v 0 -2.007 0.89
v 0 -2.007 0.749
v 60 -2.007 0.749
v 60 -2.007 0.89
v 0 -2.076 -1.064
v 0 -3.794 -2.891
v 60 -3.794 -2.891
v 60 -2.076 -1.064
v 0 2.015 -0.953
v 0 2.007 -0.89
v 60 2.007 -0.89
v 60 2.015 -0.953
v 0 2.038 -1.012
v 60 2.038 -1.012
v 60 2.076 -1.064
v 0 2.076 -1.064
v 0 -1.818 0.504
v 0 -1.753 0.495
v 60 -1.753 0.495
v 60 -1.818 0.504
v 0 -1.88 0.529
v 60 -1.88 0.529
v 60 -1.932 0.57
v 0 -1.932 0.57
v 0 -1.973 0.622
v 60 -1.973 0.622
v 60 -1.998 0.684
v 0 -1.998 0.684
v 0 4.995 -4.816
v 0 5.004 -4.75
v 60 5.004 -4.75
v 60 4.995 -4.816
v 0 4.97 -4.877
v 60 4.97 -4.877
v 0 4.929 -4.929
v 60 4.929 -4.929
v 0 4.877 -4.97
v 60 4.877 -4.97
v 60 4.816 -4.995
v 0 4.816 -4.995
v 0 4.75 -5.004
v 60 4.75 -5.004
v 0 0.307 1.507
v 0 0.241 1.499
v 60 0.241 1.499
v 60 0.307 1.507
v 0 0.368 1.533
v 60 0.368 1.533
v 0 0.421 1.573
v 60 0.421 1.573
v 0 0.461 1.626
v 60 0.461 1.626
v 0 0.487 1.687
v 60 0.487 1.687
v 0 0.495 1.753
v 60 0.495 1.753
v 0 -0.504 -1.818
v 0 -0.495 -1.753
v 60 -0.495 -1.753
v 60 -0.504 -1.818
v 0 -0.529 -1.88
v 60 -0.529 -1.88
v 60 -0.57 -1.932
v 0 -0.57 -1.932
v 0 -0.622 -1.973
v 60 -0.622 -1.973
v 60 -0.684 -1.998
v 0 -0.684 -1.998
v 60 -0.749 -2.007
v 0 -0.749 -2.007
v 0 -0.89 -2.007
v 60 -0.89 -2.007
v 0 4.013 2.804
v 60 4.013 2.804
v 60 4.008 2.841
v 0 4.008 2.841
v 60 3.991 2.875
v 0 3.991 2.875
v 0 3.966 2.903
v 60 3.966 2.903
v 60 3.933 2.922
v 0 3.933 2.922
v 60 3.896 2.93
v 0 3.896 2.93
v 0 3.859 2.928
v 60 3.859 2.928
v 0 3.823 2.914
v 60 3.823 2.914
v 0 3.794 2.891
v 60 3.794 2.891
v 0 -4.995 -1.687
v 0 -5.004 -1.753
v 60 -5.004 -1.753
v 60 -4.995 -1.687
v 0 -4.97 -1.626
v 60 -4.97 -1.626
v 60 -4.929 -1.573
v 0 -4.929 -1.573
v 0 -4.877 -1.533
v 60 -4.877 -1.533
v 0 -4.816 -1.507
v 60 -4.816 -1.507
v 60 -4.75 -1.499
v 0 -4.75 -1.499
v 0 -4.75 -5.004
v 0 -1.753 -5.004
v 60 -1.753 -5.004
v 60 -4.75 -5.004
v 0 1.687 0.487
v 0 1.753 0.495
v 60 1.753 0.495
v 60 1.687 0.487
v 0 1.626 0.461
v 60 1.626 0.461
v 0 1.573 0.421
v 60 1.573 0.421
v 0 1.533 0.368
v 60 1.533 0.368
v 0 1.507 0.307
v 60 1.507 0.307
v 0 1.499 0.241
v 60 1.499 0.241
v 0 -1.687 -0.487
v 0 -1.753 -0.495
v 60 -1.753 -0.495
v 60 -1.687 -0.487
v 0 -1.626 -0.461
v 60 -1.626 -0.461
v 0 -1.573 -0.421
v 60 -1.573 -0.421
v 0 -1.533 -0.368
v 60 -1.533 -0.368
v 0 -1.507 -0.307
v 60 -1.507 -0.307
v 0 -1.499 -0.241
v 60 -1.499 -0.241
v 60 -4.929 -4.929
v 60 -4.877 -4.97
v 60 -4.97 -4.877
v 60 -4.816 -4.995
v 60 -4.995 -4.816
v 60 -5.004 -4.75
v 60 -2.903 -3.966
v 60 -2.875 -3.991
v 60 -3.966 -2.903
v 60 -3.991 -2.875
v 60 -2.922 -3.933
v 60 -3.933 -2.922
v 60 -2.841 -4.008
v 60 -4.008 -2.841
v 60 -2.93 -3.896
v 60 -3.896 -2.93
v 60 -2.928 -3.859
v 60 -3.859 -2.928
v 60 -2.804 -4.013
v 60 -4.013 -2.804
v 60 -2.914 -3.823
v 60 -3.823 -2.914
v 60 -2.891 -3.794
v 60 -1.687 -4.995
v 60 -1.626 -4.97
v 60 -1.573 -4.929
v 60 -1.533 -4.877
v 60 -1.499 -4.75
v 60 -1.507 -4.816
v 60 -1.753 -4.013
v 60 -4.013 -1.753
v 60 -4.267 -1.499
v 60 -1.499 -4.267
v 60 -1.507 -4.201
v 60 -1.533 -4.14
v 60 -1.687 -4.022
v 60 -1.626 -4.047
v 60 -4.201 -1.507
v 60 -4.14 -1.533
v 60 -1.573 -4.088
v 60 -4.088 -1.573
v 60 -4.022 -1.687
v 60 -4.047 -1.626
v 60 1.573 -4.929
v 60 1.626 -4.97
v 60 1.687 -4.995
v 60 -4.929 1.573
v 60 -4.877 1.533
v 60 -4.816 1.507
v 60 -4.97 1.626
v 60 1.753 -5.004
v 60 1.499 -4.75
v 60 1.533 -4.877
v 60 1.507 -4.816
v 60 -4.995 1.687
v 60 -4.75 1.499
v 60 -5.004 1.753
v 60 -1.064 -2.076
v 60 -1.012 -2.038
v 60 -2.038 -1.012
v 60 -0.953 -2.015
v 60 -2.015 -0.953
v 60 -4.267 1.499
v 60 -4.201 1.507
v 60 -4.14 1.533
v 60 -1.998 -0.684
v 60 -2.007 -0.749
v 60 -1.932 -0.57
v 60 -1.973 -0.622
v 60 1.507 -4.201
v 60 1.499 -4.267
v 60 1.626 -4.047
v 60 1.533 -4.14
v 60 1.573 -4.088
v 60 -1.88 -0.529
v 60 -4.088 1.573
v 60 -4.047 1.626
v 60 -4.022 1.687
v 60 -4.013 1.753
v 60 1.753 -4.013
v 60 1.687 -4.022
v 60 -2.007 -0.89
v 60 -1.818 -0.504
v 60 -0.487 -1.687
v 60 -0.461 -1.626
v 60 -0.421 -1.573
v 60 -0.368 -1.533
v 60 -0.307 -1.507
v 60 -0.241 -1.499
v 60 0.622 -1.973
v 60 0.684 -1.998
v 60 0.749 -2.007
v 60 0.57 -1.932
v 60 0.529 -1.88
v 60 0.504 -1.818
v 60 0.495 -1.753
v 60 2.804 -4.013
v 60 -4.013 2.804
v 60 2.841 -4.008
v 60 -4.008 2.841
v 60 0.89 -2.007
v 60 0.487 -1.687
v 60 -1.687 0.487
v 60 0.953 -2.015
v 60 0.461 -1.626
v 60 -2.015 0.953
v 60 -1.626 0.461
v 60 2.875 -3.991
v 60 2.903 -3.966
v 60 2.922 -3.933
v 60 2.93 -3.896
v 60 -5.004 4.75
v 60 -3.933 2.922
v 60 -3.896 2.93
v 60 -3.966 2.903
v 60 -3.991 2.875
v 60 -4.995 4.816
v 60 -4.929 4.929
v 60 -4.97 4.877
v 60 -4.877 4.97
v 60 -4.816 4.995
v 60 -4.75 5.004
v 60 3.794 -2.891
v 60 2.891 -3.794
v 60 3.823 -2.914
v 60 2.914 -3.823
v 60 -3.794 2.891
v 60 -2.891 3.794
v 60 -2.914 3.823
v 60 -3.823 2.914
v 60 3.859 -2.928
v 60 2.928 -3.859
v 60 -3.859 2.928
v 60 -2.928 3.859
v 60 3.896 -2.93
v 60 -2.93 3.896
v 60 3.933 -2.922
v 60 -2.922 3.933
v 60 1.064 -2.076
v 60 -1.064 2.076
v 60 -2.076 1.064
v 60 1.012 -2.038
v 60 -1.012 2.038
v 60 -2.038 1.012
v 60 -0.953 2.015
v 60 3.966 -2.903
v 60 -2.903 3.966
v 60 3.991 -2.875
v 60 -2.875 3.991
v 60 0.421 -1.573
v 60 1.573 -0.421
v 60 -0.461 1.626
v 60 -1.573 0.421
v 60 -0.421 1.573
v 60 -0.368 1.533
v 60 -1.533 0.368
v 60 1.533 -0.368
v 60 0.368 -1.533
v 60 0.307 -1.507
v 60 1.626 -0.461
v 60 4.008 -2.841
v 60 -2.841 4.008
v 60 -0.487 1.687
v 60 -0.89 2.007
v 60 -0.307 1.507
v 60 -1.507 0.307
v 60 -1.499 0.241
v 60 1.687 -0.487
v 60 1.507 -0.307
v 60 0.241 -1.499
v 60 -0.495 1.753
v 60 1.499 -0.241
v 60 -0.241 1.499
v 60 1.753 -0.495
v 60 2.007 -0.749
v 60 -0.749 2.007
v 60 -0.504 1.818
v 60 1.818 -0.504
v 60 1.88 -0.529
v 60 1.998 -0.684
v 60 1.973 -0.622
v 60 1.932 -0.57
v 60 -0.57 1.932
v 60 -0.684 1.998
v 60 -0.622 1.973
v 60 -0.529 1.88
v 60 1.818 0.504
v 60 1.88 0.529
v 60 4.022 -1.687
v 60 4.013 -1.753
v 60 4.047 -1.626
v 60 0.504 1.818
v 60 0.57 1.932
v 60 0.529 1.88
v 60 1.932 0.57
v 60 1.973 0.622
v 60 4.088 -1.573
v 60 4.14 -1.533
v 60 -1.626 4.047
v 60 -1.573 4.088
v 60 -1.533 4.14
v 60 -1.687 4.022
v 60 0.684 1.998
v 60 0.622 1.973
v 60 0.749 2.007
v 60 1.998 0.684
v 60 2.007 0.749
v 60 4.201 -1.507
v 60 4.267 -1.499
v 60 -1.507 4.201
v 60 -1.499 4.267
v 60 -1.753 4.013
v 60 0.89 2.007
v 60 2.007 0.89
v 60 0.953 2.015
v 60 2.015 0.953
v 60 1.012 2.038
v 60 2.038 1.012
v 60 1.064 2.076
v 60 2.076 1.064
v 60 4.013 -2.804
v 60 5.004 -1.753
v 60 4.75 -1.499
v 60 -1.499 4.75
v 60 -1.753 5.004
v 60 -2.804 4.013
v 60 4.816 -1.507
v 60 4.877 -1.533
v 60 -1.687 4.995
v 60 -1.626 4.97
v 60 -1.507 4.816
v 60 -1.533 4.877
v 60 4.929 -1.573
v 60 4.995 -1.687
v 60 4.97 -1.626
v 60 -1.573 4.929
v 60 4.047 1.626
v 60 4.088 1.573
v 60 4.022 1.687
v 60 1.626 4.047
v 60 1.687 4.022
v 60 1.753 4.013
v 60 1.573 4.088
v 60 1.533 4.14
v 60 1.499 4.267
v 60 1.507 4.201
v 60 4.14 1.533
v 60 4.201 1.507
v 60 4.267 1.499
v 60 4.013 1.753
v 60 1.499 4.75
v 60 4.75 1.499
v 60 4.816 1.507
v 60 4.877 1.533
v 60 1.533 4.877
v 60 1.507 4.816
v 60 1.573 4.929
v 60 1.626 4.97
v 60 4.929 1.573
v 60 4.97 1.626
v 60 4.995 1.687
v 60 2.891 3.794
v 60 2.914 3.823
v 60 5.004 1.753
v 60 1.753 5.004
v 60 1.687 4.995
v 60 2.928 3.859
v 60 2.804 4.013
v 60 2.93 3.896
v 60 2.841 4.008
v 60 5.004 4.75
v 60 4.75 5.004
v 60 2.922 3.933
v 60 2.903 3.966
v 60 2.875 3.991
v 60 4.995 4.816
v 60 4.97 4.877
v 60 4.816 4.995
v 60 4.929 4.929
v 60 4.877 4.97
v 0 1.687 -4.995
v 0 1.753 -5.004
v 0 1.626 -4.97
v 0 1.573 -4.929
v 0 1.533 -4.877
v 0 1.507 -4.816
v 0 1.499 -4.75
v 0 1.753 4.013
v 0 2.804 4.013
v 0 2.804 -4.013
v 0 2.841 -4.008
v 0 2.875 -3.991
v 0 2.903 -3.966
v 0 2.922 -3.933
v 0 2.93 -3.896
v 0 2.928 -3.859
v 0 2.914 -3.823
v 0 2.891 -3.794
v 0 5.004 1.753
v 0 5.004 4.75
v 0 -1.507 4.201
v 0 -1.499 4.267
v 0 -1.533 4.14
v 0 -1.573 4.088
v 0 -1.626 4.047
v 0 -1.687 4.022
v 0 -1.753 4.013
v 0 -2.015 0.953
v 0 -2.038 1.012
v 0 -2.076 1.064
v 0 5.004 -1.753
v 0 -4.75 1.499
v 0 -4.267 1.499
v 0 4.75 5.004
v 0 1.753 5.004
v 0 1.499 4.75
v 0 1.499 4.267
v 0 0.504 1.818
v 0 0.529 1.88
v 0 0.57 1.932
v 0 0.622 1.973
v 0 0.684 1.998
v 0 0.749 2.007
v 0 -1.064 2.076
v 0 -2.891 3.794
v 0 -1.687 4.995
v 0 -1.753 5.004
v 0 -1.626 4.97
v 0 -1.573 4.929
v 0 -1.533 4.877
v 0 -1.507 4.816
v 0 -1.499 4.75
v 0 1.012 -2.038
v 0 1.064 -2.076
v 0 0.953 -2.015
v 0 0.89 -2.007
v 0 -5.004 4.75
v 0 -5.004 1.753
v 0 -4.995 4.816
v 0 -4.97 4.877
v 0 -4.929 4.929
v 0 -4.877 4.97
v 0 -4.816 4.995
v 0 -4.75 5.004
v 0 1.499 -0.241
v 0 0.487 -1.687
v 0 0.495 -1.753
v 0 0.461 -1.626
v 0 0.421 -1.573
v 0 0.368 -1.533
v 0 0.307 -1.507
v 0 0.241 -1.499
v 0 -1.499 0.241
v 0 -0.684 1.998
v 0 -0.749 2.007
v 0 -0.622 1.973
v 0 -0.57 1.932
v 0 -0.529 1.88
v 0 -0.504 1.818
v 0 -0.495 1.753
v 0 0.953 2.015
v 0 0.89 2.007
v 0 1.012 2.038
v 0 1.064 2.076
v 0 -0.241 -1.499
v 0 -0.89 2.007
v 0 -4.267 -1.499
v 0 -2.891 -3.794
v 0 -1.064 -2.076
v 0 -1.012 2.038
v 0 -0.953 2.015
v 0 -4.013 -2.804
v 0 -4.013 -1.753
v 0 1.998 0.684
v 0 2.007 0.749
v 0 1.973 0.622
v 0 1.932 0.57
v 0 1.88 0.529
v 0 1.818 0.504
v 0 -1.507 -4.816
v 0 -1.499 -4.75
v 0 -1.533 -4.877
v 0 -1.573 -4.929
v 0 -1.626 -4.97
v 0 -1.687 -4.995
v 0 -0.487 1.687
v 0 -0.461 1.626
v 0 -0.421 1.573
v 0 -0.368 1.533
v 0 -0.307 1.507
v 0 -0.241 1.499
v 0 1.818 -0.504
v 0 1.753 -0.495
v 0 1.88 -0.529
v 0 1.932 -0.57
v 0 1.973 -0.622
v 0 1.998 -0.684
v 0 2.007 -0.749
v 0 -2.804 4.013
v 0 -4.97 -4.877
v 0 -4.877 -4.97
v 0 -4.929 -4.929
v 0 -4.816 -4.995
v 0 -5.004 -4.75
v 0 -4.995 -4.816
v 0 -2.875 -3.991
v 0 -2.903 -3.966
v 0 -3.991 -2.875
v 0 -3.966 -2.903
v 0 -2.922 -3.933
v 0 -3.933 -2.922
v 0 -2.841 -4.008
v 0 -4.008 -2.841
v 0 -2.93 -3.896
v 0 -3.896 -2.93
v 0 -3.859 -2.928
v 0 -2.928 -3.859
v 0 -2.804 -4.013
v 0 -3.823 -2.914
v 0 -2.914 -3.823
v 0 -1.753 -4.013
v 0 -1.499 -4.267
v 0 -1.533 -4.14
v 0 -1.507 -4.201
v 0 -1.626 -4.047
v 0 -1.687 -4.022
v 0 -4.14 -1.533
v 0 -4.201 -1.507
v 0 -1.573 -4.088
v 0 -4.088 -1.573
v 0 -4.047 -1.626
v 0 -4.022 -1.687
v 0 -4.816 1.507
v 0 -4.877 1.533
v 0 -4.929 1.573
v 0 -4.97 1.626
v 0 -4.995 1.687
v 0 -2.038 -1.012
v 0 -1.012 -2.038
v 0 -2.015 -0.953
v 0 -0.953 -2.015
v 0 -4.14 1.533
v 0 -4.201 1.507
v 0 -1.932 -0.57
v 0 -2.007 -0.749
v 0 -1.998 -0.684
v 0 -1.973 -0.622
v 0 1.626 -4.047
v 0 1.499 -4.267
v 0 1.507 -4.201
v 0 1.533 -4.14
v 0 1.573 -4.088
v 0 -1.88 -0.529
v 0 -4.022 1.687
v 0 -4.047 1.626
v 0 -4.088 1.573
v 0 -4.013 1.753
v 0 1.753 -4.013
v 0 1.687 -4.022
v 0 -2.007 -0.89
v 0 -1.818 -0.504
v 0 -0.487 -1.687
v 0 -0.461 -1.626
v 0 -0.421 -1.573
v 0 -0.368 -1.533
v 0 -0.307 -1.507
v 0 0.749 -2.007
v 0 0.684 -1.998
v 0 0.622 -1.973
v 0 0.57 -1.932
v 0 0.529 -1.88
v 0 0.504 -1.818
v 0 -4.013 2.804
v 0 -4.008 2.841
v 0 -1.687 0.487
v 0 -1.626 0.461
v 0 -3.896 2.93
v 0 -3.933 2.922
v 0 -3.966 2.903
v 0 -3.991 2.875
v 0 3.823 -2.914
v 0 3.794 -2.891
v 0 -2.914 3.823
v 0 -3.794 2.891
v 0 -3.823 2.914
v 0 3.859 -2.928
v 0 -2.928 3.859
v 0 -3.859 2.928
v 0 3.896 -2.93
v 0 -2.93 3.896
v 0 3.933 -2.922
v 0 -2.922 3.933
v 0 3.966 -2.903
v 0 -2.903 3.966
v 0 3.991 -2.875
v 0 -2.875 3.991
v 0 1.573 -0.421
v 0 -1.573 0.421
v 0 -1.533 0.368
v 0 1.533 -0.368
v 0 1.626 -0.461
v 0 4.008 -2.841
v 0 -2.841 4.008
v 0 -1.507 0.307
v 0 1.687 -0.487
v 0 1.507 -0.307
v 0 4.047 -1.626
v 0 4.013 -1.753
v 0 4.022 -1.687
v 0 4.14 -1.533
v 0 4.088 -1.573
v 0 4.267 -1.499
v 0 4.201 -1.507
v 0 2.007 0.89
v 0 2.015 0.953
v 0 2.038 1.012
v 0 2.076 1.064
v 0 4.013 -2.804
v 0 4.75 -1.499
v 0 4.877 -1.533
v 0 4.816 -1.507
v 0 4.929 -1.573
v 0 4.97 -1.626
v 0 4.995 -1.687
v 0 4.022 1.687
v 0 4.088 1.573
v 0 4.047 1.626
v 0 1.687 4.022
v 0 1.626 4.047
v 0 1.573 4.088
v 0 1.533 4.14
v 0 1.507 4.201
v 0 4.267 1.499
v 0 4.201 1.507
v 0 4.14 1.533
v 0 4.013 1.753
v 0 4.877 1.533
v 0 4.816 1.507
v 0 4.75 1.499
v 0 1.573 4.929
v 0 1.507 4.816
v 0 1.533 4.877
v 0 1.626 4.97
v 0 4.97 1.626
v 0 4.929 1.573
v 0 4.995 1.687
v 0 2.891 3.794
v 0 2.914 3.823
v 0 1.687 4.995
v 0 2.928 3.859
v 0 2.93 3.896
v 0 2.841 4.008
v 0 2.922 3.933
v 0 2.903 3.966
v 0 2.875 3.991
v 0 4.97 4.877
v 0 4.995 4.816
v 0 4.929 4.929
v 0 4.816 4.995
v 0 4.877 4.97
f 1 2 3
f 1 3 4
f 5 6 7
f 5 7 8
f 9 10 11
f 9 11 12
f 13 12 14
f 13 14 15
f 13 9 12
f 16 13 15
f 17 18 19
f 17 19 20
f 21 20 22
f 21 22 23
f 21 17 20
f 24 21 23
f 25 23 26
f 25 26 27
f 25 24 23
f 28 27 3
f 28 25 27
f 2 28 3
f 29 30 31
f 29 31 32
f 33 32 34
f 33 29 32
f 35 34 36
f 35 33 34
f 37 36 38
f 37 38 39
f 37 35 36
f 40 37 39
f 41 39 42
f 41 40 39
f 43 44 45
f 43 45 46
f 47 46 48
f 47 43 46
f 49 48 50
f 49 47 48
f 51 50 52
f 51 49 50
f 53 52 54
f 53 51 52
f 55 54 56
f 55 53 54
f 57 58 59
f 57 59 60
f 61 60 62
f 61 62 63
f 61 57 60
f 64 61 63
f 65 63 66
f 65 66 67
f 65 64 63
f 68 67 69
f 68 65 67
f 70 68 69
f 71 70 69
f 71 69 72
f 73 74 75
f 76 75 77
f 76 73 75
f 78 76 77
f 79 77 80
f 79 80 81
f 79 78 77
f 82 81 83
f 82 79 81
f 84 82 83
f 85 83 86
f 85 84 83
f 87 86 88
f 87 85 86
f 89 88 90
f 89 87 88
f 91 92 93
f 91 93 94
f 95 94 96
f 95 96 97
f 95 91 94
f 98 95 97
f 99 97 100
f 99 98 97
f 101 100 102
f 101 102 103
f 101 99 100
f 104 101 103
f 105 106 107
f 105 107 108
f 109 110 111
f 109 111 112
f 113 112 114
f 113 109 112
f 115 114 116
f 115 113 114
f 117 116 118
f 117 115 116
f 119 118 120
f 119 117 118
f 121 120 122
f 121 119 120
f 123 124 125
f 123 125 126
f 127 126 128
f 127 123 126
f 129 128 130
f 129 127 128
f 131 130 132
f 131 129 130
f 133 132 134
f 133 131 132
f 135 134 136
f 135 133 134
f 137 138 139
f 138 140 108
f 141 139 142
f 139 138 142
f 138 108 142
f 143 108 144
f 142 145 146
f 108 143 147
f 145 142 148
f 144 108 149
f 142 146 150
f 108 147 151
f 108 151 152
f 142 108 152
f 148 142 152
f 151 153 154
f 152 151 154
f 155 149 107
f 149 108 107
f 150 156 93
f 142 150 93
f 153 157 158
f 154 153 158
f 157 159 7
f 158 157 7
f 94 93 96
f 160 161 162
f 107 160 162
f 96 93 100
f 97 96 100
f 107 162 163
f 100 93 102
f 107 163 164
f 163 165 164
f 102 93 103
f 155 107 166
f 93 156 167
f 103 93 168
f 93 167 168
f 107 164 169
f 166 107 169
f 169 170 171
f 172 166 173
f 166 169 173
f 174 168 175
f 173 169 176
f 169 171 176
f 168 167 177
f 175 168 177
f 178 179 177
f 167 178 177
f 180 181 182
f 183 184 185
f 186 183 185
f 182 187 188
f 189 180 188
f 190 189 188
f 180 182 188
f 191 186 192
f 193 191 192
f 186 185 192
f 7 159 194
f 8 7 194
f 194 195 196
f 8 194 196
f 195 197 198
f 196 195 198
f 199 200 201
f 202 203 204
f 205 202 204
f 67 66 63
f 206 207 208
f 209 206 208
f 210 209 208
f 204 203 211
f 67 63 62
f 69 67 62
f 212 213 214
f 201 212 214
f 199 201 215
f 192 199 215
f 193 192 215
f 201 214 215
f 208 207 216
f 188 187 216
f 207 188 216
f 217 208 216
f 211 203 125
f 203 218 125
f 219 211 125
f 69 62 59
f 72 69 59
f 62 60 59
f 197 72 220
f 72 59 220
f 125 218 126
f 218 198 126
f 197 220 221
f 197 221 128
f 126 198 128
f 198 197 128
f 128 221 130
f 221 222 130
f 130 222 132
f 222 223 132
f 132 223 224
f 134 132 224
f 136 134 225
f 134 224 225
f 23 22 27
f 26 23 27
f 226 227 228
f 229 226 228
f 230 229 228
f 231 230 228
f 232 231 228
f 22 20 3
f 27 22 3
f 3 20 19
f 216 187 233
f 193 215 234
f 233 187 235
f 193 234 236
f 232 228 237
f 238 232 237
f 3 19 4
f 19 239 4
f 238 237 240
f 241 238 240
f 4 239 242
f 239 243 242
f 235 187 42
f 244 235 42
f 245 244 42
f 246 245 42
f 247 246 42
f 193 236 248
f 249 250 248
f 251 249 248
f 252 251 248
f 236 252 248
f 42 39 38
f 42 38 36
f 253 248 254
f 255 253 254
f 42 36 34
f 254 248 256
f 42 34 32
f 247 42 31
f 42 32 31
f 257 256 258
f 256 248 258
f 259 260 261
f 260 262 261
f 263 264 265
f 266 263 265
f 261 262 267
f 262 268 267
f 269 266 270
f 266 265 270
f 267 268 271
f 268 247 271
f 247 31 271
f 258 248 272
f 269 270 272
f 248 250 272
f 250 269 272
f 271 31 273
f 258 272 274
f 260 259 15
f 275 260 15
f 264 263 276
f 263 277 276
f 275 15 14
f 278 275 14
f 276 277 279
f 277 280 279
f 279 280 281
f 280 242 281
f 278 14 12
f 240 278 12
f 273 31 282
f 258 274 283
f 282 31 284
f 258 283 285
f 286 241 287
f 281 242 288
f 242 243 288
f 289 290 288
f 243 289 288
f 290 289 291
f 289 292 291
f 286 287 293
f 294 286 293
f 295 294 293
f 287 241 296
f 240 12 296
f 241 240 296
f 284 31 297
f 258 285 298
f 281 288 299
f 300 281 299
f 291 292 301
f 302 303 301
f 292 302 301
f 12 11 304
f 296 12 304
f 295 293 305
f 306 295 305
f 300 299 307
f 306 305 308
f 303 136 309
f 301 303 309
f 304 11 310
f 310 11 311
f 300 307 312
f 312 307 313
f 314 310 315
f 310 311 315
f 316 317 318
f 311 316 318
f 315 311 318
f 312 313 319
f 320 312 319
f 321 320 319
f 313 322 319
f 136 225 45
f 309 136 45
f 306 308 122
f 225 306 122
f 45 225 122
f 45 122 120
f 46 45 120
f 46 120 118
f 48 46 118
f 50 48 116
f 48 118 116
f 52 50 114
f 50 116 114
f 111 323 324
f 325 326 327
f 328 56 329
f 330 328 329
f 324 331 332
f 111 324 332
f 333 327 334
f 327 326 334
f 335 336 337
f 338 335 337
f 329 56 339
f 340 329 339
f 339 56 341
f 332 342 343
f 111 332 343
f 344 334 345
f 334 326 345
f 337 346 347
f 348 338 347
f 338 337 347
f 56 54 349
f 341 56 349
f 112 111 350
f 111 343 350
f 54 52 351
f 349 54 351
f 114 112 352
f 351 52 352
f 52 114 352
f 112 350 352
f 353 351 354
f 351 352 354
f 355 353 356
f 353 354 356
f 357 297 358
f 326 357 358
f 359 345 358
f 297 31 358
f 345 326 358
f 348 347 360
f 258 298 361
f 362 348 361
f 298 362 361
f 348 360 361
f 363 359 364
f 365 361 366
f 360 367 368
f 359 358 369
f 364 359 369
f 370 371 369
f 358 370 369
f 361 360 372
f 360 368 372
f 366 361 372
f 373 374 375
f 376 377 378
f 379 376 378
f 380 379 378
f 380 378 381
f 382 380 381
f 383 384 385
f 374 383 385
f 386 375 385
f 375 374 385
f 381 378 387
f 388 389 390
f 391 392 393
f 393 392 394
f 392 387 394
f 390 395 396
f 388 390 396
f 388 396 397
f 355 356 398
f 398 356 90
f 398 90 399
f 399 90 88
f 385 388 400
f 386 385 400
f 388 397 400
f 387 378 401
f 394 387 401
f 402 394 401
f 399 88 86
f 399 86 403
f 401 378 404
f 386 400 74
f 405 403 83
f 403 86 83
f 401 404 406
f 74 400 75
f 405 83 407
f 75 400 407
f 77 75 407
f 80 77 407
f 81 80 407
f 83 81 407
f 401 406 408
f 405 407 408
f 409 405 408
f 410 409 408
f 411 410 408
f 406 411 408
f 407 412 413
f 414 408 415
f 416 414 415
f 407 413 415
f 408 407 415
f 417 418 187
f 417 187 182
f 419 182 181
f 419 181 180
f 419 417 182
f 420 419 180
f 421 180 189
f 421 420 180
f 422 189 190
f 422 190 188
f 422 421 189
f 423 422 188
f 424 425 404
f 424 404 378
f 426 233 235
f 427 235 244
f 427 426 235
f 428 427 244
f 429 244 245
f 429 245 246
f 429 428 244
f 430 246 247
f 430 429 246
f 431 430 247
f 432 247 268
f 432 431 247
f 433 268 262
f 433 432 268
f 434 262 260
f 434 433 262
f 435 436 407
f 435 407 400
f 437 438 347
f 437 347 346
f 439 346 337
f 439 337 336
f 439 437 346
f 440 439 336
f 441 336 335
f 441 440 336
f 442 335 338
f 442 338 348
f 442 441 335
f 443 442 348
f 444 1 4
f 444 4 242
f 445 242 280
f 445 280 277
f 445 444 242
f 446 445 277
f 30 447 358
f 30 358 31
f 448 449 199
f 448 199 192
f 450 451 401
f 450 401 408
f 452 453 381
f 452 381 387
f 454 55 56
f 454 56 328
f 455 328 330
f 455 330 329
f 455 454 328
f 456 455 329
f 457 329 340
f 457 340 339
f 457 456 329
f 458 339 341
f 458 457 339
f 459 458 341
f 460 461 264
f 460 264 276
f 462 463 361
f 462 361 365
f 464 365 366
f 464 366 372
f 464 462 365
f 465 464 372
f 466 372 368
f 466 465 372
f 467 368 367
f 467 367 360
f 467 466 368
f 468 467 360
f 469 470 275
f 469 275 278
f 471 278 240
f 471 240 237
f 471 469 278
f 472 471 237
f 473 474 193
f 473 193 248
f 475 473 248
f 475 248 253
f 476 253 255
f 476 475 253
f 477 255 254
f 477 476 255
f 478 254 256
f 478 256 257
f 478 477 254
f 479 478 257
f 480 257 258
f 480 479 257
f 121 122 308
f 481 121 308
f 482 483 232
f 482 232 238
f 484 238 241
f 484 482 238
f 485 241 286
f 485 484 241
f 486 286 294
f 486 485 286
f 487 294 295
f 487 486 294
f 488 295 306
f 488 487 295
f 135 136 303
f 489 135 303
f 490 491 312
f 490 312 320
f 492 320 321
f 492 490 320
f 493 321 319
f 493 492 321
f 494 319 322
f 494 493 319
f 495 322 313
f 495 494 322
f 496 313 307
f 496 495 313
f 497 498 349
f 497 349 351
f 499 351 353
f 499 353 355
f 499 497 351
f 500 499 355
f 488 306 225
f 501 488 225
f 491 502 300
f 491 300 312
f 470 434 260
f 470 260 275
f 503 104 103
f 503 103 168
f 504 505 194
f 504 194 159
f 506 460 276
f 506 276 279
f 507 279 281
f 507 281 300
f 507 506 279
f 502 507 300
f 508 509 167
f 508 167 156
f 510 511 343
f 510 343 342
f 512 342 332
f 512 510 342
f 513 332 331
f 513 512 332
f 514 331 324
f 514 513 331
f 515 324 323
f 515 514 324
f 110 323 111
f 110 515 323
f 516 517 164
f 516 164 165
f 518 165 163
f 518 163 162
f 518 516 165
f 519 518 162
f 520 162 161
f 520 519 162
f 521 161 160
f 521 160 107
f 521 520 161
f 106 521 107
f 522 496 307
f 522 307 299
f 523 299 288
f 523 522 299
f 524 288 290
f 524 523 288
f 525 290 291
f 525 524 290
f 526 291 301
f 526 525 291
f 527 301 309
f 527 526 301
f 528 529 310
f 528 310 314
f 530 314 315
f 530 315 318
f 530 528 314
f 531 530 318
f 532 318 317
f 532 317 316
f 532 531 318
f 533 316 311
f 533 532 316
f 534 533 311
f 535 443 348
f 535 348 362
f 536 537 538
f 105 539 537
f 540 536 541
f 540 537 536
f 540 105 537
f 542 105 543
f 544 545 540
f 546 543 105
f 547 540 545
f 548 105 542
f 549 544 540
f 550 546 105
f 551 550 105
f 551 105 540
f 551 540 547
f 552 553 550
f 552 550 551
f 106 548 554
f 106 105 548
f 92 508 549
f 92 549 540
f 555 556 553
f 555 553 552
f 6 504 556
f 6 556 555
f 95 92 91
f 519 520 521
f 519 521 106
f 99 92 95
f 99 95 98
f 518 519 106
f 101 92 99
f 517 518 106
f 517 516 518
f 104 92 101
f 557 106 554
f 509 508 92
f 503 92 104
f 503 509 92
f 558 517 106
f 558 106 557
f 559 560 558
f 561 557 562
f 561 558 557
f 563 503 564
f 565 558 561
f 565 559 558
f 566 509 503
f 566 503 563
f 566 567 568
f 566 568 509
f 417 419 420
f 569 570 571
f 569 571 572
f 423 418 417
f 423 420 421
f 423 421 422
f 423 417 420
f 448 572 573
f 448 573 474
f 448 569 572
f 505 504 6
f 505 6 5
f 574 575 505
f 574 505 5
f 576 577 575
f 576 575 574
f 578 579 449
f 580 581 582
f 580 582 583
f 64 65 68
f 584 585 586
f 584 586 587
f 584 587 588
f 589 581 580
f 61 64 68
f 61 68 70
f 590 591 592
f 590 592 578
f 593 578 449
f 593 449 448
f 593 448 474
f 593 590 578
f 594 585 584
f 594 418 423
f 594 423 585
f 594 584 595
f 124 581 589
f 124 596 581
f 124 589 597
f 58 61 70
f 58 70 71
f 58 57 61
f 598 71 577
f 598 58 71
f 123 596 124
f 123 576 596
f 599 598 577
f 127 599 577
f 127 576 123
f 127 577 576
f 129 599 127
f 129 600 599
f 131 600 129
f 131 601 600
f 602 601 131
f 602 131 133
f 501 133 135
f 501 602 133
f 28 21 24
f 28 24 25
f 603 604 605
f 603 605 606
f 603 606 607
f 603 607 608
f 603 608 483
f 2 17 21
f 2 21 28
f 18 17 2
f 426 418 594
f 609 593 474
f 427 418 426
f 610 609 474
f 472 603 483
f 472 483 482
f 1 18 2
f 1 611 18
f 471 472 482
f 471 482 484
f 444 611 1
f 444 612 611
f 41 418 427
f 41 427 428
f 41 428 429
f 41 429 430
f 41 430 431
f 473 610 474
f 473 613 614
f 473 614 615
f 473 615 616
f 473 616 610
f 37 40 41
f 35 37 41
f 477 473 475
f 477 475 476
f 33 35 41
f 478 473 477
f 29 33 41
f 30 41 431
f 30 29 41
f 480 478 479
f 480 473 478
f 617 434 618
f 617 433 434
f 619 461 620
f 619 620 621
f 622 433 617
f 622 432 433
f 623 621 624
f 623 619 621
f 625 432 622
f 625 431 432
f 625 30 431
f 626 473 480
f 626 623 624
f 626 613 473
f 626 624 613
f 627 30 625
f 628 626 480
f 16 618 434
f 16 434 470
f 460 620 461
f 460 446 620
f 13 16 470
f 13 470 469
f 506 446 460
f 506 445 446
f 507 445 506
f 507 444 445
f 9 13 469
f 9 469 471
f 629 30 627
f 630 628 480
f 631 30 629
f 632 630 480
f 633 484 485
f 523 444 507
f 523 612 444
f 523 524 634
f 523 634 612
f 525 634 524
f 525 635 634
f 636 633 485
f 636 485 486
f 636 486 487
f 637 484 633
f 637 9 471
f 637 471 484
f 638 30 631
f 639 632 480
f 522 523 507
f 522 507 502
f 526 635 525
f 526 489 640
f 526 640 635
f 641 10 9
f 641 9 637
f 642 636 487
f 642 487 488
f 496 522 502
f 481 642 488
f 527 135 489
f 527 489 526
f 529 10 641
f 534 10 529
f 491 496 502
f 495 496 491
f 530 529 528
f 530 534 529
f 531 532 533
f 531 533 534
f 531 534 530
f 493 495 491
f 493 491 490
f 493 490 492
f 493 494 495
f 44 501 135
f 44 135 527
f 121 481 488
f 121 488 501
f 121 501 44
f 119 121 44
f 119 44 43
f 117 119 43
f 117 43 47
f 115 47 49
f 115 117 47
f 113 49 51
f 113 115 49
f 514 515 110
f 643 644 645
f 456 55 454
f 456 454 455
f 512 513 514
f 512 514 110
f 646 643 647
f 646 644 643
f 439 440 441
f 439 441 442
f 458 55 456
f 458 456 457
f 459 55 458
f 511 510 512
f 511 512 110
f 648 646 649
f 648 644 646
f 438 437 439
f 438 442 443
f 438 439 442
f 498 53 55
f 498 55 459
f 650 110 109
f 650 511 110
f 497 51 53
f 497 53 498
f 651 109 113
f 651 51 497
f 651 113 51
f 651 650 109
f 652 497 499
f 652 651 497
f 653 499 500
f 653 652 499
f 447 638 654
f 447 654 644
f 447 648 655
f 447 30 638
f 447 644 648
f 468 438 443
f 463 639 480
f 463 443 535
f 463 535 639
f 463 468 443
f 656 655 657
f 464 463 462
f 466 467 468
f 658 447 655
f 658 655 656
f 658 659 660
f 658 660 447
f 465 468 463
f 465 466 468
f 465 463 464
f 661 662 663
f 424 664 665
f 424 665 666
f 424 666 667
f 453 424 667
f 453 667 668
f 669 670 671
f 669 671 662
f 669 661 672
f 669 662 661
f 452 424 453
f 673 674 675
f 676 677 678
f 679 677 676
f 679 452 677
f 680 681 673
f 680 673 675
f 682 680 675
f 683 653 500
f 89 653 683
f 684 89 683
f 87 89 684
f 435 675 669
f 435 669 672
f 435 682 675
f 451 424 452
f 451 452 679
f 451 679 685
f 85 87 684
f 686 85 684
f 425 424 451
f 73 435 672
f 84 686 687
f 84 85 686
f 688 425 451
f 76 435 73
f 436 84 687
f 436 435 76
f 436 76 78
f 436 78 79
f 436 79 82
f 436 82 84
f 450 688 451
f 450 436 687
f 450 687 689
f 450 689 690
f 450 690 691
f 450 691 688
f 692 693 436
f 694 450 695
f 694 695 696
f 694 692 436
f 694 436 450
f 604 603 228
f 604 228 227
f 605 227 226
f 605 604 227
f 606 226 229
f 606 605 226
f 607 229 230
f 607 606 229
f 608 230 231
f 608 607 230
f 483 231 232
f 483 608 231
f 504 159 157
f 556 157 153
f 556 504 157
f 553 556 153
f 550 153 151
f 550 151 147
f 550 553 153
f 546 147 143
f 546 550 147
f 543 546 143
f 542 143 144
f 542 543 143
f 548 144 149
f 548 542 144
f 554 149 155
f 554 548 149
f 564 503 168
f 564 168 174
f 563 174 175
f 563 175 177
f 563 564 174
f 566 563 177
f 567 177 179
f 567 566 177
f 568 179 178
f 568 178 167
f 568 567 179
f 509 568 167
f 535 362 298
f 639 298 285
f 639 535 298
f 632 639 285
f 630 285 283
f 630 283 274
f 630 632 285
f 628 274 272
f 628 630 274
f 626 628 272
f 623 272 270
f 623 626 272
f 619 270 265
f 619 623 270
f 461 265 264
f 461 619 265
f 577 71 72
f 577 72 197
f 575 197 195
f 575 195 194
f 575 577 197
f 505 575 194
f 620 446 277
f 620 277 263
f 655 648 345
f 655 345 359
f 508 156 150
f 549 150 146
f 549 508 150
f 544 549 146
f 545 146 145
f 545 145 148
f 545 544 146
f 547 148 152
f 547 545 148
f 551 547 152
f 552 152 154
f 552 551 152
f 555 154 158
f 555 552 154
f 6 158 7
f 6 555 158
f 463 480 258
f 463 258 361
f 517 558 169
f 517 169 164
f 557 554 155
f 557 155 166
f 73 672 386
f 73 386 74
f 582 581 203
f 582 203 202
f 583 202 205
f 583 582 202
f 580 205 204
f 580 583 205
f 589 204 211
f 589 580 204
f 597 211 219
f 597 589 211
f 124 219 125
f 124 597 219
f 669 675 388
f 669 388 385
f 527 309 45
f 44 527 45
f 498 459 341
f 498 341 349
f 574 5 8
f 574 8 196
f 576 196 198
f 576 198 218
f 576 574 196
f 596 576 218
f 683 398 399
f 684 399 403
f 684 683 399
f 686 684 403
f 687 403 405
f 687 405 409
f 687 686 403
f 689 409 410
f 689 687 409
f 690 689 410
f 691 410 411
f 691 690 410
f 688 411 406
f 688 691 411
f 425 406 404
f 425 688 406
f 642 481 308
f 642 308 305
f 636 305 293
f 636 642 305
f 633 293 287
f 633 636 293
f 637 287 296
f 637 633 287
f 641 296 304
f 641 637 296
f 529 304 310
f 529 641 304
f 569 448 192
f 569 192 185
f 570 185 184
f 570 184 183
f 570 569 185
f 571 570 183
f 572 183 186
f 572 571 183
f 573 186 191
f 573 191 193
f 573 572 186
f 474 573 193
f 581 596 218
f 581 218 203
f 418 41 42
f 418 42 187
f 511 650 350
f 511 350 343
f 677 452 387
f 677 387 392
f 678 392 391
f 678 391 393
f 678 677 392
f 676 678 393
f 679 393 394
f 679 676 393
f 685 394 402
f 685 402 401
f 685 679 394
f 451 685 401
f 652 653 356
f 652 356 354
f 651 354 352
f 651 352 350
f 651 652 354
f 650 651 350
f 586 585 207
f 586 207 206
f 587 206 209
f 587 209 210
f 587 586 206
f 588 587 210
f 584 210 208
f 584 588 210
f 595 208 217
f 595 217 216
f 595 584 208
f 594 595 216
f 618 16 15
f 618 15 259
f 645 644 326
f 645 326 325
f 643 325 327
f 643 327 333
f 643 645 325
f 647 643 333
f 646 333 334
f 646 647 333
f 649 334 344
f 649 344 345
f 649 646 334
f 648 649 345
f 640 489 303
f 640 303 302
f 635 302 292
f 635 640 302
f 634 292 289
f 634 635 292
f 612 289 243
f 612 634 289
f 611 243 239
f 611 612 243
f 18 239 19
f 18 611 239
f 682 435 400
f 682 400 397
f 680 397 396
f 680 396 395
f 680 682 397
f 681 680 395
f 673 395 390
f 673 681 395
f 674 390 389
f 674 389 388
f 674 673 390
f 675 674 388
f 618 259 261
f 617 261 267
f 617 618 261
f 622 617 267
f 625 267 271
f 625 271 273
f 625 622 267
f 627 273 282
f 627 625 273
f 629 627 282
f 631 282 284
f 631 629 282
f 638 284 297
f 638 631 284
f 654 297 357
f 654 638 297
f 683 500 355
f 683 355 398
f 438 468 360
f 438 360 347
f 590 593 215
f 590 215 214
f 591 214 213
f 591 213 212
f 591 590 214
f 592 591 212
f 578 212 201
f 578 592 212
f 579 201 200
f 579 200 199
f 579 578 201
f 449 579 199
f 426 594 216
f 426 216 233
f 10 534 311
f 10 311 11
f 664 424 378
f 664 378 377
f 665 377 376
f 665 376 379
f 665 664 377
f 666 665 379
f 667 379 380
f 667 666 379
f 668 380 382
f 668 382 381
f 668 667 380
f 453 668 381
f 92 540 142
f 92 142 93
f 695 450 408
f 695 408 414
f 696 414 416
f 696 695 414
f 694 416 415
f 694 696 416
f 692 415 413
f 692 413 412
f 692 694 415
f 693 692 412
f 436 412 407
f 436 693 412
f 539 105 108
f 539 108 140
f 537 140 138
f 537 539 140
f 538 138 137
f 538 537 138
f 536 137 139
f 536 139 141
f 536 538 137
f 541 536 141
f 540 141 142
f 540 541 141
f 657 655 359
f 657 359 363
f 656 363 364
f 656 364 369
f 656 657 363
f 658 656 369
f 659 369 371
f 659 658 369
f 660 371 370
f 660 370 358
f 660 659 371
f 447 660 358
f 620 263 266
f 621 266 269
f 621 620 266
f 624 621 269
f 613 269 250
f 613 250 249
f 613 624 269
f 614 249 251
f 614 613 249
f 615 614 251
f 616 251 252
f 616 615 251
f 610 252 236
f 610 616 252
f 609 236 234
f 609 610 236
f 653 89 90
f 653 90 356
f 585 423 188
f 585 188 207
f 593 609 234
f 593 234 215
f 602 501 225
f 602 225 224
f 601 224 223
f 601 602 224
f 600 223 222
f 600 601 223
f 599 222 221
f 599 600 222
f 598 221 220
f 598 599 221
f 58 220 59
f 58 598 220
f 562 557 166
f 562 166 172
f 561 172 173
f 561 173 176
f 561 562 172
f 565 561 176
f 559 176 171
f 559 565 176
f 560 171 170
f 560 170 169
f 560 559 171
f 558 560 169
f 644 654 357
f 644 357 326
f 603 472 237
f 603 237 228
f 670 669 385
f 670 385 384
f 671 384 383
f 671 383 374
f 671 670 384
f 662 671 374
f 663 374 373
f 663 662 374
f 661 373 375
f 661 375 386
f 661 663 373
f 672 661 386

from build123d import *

# Parameters (mm, degrees)
BOSS_EXTRU_1_DEPTH = 60


with BuildPart() as part:
    # Sketch1 → Boss.-Extru.1 (new body)
    with BuildSketch(Plane(origin=(0, 0, 0), x_dir=(0, 0, -1), z_dir=(1, 0, 0))):
        with BuildLine():
            Line((-0.2413, 1.4986), (0.2413, 1.4986))
            ThreePointArc((0.2413, 1.4986), (0.420905122, 1.572994878), (0.4953, 1.7526))
            ThreePointArc((0.4953, 1.7526), (0.569694878, 1.932205122), (0.7493, 2.0066))
            Line((0.7493, 2.0066), (0.889923986, 2.0066))
            ThreePointArc((0.889923986, 2.0066), (0.983516259, 2.024471886), (1.063937899, 2.075572548))
            Line((1.063937899, 2.075572548), (2.890793, 3.793686274))
            ThreePointArc((2.890793, 3.793686274), (2.921850101, 3.932996137), (2.803786044, 4.0132))
            Line((2.803786044, 4.0132), (1.7526, 4.0132))
            ThreePointArc((1.7526, 4.0132), (1.572994878, 4.087594878), (1.4986, 4.2672))
            Line((1.4986, 4.2672), (1.4986, 4.7498))
            ThreePointArc((1.4986, 4.7498), (1.572994878, 4.929405122), (1.7526, 5.0038))
            Line((1.7526, 5.0038), (4.7498, 5.0038))
            ThreePointArc((4.7498, 5.0038), (4.929405122, 4.929405122), (5.0038, 4.7498))
            Line((5.0038, 4.7498), (5.0038, 1.7526))
            ThreePointArc((5.0038, 1.7526), (4.929405122, 1.572994878), (4.7498, 1.4986))
            Line((4.7498, 1.4986), (4.2672, 1.4986))
            ThreePointArc((4.2672, 1.4986), (4.087594878, 1.572994878), (4.0132, 1.7526))
            Line((4.0132, 1.7526), (4.0132, 2.803786044))
            ThreePointArc((4.0132, 2.803786044), (3.932996137, 2.921850101), (3.793686274, 2.890793))
            Line((3.793686274, 2.890793), (2.075572548, 1.063937899))
            ThreePointArc((2.075572548, 1.063937899), (2.024471886, 0.983516259), (2.0066, 0.889923986))
            Line((2.0066, 0.889923986), (2.0066, 0.7493))
            ThreePointArc((2.0066, 0.7493), (1.932205122, 0.569694878), (1.7526, 0.4953))
            ThreePointArc((1.7526, 0.4953), (1.572994878, 0.420905122), (1.4986, 0.2413))
            Line((1.4986, 0.2413), (1.4986, -0.2413))
            ThreePointArc((1.4986, -0.2413), (1.572994878, -0.420905122), (1.7526, -0.4953))
            ThreePointArc((1.7526, -0.4953), (1.932205122, -0.569694878), (2.0066, -0.7493))
            Line((2.0066, -0.7493), (2.0066, -0.889923986))
            ThreePointArc((2.0066, -0.889923986), (2.024471886, -0.983516259), (2.075572548, -1.063937899))
            Line((2.075572548, -1.063937899), (3.793686274, -2.890793))
            ThreePointArc((3.793686274, -2.890793), (3.932996137, -2.921850101), (4.0132, -2.803786044))
            Line((4.0132, -2.803786044), (4.0132, -1.7526))
            ThreePointArc((4.0132, -1.7526), (4.087594878, -1.572994878), (4.2672, -1.4986))
            Line((4.2672, -1.4986), (4.7498, -1.4986))
            ThreePointArc((4.7498, -1.4986), (4.929405122, -1.572994878), (5.0038, -1.7526))
            Line((5.0038, -1.7526), (5.0038, -4.7498))
            ThreePointArc((5.0038, -4.7498), (4.929405122, -4.929405122), (4.7498, -5.0038))
            Line((4.7498, -5.0038), (1.7526, -5.0038))
            ThreePointArc((1.7526, -5.0038), (1.572994878, -4.929405122), (1.4986, -4.7498))
            Line((1.4986, -4.7498), (1.4986, -4.2672))
            ThreePointArc((1.4986, -4.2672), (1.572994878, -4.087594878), (1.7526, -4.0132))
            Line((1.7526, -4.0132), (2.803786044, -4.0132))
            ThreePointArc((2.803786044, -4.0132), (2.921850101, -3.932996137), (2.890793, -3.793686274))
            Line((2.890793, -3.793686274), (1.063937899, -2.075572548))
            ThreePointArc((1.063937899, -2.075572548), (0.983516259, -2.024471886), (0.889923986, -2.0066))
            Line((0.889923986, -2.0066), (0.7493, -2.0066))
            ThreePointArc((0.7493, -2.0066), (0.569694878, -1.932205122), (0.4953, -1.7526))
            ThreePointArc((0.4953, -1.7526), (0.420905122, -1.572994878), (0.2413, -1.4986))
            Line((0.2413, -1.4986), (-0.2413, -1.4986))
            ThreePointArc((-0.2413, -1.4986), (-0.420905122, -1.572994878), (-0.4953, -1.7526))
            ThreePointArc((-0.4953, -1.7526), (-0.569694878, -1.932205122), (-0.7493, -2.0066))
            Line((-0.7493, -2.0066), (-0.889923986, -2.0066))
            ThreePointArc((-0.889923986, -2.0066), (-0.983516259, -2.024471886), (-1.063937899, -2.075572548))
            Line((-1.063937899, -2.075572548), (-2.890793, -3.793686274))
            ThreePointArc((-2.890793, -3.793686274), (-2.921850101, -3.932996137), (-2.803786044, -4.0132))
            Line((-2.803786044, -4.0132), (-1.7526, -4.0132))
            ThreePointArc((-1.7526, -4.0132), (-1.572994878, -4.087594878), (-1.4986, -4.2672))
            Line((-1.4986, -4.2672), (-1.4986, -4.7498))
            ThreePointArc((-1.4986, -4.7498), (-1.572994878, -4.929405122), (-1.7526, -5.0038))
            Line((-1.7526, -5.0038), (-4.7498, -5.0038))
            ThreePointArc((-4.7498, -5.0038), (-4.929405122, -4.929405122), (-5.0038, -4.7498))
            Line((-5.0038, -4.7498), (-5.0038, -1.7526))
            ThreePointArc((-5.0038, -1.7526), (-4.929405122, -1.572994878), (-4.7498, -1.4986))
            Line((-4.7498, -1.4986), (-4.2672, -1.4986))
            ThreePointArc((-4.2672, -1.4986), (-4.087594878, -1.572994878), (-4.0132, -1.7526))
            Line((-4.0132, -1.7526), (-4.0132, -2.803786044))
            ThreePointArc((-4.0132, -2.803786044), (-3.932996137, -2.921850101), (-3.793686274, -2.890793))
            Line((-3.793686274, -2.890793), (-2.075572548, -1.063937899))
            ThreePointArc((-2.075572548, -1.063937899), (-2.024471886, -0.983516259), (-2.0066, -0.889923986))
            Line((-2.0066, -0.889923986), (-2.0066, -0.7493))
            ThreePointArc((-2.0066, -0.7493), (-1.932205122, -0.569694878), (-1.7526, -0.4953))
            ThreePointArc((-1.7526, -0.4953), (-1.572994878, -0.420905122), (-1.4986, -0.2413))
            Line((-1.4986, -0.2413), (-1.4986, 0.2413))
            ThreePointArc((-1.4986, 0.2413), (-1.572994878, 0.420905122), (-1.7526, 0.4953))
            ThreePointArc((-1.7526, 0.4953), (-1.932205122, 0.569694878), (-2.0066, 0.7493))
            Line((-2.0066, 0.7493), (-2.0066, 0.889923986))
            ThreePointArc((-2.0066, 0.889923986), (-2.024471886, 0.983516259), (-2.075572548, 1.063937899))
            Line((-2.075572548, 1.063937899), (-3.793686274, 2.890793))
            ThreePointArc((-3.793686274, 2.890793), (-3.932996137, 2.921850101), (-4.0132, 2.803786044))
            Line((-4.0132, 2.803786044), (-4.0132, 1.7526))
            ThreePointArc((-4.0132, 1.7526), (-4.087594878, 1.572994878), (-4.2672, 1.4986))
            Line((-4.2672, 1.4986), (-4.7498, 1.4986))
            ThreePointArc((-4.7498, 1.4986), (-4.929405122, 1.572994878), (-5.0038, 1.7526))
            Line((-5.0038, 1.7526), (-5.0038, 4.7498))
            ThreePointArc((-5.0038, 4.7498), (-4.929405122, 4.929405122), (-4.7498, 5.0038))
            Line((-4.7498, 5.0038), (-1.7526, 5.0038))
            ThreePointArc((-1.7526, 5.0038), (-1.572994878, 4.929405122), (-1.4986, 4.7498))
            Line((-1.4986, 4.7498), (-1.4986, 4.2672))
            ThreePointArc((-1.4986, 4.2672), (-1.572994878, 4.087594878), (-1.7526, 4.0132))
            Line((-1.7526, 4.0132), (-2.803786044, 4.0132))
            ThreePointArc((-2.803786044, 4.0132), (-2.921850101, 3.932996137), (-2.890793, 3.793686274))
            Line((-2.890793, 3.793686274), (-1.063937899, 2.075572548))
            ThreePointArc((-1.063937899, 2.075572548), (-0.983516259, 2.024471886), (-0.889923986, 2.0066))
            Line((-0.889923986, 2.0066), (-0.7493, 2.0066))
            ThreePointArc((-0.7493, 2.0066), (-0.569694878, 1.932205122), (-0.4953, 1.7526))
            ThreePointArc((-0.4953, 1.7526), (-0.420905122, 1.572994878), (-0.2413, 1.4986))
        make_face()
    extrude(amount=BOSS_EXTRU_1_DEPTH)


solid = part.part
